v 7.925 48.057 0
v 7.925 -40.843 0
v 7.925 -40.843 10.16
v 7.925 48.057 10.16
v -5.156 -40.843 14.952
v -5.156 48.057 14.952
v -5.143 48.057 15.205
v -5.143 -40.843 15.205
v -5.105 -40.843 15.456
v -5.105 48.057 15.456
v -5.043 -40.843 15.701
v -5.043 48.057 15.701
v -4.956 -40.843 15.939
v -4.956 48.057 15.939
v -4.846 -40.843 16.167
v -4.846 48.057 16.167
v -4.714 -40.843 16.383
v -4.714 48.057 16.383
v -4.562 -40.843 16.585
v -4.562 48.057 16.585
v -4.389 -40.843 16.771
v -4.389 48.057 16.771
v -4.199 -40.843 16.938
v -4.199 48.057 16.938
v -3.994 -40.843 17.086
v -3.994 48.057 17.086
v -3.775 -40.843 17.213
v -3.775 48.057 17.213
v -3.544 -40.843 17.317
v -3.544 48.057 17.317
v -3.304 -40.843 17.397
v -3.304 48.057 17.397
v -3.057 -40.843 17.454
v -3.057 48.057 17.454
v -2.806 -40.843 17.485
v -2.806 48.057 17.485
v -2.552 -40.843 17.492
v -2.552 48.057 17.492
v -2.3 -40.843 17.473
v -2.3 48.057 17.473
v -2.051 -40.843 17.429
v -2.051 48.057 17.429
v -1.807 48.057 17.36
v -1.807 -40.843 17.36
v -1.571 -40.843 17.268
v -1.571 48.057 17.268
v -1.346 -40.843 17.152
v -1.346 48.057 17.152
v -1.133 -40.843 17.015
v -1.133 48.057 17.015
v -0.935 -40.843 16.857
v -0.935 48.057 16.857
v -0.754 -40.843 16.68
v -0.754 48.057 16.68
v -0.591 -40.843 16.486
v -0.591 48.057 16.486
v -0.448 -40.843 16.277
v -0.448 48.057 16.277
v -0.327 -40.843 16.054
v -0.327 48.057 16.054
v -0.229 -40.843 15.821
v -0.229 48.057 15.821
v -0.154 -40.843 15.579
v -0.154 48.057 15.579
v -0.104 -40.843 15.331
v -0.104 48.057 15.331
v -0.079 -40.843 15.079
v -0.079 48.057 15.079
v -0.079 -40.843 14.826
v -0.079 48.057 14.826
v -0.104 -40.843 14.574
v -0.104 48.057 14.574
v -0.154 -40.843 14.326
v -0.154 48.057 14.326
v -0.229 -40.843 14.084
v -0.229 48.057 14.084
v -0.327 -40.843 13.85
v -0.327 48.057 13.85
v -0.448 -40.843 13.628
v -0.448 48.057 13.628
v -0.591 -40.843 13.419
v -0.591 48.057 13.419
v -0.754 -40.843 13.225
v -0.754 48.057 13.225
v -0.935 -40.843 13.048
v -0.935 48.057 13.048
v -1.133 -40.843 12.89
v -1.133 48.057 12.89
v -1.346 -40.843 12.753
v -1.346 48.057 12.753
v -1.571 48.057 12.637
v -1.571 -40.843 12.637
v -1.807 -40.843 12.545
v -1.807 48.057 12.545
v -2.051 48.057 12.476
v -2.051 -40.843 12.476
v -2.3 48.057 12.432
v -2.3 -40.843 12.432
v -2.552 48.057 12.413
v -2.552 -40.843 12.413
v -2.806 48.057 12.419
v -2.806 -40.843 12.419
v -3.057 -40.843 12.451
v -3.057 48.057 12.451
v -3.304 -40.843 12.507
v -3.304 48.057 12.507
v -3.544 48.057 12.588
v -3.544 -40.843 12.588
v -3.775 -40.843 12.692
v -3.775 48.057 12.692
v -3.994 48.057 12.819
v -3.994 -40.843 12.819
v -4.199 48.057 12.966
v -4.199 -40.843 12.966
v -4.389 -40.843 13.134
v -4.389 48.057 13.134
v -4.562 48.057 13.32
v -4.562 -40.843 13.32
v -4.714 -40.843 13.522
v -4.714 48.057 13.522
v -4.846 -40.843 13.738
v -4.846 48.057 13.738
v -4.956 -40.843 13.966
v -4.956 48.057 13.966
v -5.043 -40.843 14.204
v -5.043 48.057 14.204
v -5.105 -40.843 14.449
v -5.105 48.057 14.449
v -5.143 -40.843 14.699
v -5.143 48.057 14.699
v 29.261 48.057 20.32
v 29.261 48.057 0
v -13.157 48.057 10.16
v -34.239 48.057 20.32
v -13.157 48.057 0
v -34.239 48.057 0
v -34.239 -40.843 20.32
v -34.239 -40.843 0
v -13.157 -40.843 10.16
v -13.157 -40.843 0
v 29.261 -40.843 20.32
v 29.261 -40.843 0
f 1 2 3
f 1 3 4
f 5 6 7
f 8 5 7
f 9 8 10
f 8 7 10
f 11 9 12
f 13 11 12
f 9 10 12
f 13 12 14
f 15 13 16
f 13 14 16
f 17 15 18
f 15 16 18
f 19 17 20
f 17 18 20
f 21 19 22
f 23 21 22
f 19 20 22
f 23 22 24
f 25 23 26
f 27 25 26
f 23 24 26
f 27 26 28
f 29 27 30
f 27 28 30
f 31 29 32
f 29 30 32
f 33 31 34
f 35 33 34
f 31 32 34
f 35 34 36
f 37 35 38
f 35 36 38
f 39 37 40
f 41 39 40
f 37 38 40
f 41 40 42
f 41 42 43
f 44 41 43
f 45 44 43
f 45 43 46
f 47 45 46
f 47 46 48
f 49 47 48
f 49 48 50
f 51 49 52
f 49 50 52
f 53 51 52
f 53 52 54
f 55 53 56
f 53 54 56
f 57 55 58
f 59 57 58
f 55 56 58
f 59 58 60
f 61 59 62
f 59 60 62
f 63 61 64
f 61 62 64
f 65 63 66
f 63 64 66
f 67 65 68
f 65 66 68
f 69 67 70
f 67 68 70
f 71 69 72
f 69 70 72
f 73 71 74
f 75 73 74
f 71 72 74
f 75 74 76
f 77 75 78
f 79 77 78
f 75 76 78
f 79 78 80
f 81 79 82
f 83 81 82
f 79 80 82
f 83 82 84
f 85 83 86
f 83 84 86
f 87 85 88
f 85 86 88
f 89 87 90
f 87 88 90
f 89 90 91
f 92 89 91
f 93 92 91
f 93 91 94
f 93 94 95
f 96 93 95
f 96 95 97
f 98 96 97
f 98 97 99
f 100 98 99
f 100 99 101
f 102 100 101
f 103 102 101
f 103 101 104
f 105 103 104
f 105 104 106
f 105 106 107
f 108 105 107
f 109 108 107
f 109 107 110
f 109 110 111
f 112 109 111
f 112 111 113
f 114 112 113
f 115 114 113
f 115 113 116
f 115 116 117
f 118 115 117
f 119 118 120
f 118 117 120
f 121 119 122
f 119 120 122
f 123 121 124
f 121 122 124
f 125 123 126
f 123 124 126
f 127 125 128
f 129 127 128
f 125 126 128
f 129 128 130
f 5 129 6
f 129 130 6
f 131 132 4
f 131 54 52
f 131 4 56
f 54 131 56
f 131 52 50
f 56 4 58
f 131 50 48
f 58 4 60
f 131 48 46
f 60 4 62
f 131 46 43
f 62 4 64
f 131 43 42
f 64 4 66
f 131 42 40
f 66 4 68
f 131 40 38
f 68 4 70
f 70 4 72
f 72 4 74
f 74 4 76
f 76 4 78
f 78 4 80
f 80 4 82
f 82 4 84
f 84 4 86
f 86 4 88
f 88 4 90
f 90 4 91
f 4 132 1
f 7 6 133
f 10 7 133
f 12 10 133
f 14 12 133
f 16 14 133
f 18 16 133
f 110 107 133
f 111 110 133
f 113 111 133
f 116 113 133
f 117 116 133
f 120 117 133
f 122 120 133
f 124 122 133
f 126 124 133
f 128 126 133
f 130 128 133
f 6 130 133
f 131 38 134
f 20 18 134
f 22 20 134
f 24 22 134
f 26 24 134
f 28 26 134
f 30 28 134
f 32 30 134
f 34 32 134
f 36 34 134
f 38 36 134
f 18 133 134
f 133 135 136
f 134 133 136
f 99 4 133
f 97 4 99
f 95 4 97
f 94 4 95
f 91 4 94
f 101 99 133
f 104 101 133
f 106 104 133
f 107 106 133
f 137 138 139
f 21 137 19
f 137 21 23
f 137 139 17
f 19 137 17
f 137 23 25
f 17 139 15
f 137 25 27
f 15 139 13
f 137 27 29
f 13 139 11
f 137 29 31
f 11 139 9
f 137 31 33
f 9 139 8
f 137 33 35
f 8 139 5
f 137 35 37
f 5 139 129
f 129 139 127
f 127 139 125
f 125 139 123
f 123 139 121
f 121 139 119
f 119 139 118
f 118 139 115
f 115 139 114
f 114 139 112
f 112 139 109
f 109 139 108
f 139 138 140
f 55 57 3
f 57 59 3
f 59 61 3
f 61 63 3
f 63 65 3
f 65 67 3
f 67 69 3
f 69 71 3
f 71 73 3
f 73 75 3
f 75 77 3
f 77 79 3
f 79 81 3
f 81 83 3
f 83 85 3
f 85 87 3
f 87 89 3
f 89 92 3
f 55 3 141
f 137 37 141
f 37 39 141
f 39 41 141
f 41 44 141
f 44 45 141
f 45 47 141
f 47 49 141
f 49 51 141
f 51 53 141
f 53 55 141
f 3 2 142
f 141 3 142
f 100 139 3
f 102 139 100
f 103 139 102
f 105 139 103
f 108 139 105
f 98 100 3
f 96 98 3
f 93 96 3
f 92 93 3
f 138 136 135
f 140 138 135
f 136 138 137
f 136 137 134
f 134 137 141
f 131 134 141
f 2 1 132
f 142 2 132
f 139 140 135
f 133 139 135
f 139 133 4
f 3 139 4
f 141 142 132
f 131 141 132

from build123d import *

# Parameters (mm, degrees)
F0_W     = 21.082
F0_H     = 88.9
F0_W_2   = 21.336
F1_DEPTH = 20.32
F2_DEPTH = 10.16
F3_R     = 2.54
F5_DEPTH = 88.9


# Not quite as in the source:
# - the program builds the solid bodies; features that only make, move or delete a surface that nothing else refers to are left out


with BuildPart() as f1:
    # F0 (on Top) → F1 (new body)
    with BuildSketch(Plane.XY):
        with Locations((-23.6977891486, 3.6070292577)):
            Rectangle(F0_W, F0_H)
        with Locations((-2.6157891486, 3.6070292577)):
            Rectangle(F0_W, F0_H)
        with Locations((18.5932108514, 3.6070292577)):
            Rectangle(F0_W_2, F0_H)
    extrude(amount=F1_DEPTH)

    # F0 (on Top) → F2 (cut)
    with BuildSketch(Plane.XY):
        with Locations((-2.6157891486, 3.6070292577)):
            Rectangle(F0_W, F0_H)
    extrude(amount=F2_DEPTH, mode=Mode.SUBTRACT)

    # F3 (on face) → F5 (cut)
    with BuildSketch(Plane(origin=(0, 48.0570292577, 0), x_dir=(-1, 0, 0), z_dir=(0, 1, 0))):
        with Locations((2.6157891486, 14.9523410946)):
            Circle(F3_R)
    extrude(amount=-F5_DEPTH, mode=Mode.SUBTRACT)


solid = f1.part
